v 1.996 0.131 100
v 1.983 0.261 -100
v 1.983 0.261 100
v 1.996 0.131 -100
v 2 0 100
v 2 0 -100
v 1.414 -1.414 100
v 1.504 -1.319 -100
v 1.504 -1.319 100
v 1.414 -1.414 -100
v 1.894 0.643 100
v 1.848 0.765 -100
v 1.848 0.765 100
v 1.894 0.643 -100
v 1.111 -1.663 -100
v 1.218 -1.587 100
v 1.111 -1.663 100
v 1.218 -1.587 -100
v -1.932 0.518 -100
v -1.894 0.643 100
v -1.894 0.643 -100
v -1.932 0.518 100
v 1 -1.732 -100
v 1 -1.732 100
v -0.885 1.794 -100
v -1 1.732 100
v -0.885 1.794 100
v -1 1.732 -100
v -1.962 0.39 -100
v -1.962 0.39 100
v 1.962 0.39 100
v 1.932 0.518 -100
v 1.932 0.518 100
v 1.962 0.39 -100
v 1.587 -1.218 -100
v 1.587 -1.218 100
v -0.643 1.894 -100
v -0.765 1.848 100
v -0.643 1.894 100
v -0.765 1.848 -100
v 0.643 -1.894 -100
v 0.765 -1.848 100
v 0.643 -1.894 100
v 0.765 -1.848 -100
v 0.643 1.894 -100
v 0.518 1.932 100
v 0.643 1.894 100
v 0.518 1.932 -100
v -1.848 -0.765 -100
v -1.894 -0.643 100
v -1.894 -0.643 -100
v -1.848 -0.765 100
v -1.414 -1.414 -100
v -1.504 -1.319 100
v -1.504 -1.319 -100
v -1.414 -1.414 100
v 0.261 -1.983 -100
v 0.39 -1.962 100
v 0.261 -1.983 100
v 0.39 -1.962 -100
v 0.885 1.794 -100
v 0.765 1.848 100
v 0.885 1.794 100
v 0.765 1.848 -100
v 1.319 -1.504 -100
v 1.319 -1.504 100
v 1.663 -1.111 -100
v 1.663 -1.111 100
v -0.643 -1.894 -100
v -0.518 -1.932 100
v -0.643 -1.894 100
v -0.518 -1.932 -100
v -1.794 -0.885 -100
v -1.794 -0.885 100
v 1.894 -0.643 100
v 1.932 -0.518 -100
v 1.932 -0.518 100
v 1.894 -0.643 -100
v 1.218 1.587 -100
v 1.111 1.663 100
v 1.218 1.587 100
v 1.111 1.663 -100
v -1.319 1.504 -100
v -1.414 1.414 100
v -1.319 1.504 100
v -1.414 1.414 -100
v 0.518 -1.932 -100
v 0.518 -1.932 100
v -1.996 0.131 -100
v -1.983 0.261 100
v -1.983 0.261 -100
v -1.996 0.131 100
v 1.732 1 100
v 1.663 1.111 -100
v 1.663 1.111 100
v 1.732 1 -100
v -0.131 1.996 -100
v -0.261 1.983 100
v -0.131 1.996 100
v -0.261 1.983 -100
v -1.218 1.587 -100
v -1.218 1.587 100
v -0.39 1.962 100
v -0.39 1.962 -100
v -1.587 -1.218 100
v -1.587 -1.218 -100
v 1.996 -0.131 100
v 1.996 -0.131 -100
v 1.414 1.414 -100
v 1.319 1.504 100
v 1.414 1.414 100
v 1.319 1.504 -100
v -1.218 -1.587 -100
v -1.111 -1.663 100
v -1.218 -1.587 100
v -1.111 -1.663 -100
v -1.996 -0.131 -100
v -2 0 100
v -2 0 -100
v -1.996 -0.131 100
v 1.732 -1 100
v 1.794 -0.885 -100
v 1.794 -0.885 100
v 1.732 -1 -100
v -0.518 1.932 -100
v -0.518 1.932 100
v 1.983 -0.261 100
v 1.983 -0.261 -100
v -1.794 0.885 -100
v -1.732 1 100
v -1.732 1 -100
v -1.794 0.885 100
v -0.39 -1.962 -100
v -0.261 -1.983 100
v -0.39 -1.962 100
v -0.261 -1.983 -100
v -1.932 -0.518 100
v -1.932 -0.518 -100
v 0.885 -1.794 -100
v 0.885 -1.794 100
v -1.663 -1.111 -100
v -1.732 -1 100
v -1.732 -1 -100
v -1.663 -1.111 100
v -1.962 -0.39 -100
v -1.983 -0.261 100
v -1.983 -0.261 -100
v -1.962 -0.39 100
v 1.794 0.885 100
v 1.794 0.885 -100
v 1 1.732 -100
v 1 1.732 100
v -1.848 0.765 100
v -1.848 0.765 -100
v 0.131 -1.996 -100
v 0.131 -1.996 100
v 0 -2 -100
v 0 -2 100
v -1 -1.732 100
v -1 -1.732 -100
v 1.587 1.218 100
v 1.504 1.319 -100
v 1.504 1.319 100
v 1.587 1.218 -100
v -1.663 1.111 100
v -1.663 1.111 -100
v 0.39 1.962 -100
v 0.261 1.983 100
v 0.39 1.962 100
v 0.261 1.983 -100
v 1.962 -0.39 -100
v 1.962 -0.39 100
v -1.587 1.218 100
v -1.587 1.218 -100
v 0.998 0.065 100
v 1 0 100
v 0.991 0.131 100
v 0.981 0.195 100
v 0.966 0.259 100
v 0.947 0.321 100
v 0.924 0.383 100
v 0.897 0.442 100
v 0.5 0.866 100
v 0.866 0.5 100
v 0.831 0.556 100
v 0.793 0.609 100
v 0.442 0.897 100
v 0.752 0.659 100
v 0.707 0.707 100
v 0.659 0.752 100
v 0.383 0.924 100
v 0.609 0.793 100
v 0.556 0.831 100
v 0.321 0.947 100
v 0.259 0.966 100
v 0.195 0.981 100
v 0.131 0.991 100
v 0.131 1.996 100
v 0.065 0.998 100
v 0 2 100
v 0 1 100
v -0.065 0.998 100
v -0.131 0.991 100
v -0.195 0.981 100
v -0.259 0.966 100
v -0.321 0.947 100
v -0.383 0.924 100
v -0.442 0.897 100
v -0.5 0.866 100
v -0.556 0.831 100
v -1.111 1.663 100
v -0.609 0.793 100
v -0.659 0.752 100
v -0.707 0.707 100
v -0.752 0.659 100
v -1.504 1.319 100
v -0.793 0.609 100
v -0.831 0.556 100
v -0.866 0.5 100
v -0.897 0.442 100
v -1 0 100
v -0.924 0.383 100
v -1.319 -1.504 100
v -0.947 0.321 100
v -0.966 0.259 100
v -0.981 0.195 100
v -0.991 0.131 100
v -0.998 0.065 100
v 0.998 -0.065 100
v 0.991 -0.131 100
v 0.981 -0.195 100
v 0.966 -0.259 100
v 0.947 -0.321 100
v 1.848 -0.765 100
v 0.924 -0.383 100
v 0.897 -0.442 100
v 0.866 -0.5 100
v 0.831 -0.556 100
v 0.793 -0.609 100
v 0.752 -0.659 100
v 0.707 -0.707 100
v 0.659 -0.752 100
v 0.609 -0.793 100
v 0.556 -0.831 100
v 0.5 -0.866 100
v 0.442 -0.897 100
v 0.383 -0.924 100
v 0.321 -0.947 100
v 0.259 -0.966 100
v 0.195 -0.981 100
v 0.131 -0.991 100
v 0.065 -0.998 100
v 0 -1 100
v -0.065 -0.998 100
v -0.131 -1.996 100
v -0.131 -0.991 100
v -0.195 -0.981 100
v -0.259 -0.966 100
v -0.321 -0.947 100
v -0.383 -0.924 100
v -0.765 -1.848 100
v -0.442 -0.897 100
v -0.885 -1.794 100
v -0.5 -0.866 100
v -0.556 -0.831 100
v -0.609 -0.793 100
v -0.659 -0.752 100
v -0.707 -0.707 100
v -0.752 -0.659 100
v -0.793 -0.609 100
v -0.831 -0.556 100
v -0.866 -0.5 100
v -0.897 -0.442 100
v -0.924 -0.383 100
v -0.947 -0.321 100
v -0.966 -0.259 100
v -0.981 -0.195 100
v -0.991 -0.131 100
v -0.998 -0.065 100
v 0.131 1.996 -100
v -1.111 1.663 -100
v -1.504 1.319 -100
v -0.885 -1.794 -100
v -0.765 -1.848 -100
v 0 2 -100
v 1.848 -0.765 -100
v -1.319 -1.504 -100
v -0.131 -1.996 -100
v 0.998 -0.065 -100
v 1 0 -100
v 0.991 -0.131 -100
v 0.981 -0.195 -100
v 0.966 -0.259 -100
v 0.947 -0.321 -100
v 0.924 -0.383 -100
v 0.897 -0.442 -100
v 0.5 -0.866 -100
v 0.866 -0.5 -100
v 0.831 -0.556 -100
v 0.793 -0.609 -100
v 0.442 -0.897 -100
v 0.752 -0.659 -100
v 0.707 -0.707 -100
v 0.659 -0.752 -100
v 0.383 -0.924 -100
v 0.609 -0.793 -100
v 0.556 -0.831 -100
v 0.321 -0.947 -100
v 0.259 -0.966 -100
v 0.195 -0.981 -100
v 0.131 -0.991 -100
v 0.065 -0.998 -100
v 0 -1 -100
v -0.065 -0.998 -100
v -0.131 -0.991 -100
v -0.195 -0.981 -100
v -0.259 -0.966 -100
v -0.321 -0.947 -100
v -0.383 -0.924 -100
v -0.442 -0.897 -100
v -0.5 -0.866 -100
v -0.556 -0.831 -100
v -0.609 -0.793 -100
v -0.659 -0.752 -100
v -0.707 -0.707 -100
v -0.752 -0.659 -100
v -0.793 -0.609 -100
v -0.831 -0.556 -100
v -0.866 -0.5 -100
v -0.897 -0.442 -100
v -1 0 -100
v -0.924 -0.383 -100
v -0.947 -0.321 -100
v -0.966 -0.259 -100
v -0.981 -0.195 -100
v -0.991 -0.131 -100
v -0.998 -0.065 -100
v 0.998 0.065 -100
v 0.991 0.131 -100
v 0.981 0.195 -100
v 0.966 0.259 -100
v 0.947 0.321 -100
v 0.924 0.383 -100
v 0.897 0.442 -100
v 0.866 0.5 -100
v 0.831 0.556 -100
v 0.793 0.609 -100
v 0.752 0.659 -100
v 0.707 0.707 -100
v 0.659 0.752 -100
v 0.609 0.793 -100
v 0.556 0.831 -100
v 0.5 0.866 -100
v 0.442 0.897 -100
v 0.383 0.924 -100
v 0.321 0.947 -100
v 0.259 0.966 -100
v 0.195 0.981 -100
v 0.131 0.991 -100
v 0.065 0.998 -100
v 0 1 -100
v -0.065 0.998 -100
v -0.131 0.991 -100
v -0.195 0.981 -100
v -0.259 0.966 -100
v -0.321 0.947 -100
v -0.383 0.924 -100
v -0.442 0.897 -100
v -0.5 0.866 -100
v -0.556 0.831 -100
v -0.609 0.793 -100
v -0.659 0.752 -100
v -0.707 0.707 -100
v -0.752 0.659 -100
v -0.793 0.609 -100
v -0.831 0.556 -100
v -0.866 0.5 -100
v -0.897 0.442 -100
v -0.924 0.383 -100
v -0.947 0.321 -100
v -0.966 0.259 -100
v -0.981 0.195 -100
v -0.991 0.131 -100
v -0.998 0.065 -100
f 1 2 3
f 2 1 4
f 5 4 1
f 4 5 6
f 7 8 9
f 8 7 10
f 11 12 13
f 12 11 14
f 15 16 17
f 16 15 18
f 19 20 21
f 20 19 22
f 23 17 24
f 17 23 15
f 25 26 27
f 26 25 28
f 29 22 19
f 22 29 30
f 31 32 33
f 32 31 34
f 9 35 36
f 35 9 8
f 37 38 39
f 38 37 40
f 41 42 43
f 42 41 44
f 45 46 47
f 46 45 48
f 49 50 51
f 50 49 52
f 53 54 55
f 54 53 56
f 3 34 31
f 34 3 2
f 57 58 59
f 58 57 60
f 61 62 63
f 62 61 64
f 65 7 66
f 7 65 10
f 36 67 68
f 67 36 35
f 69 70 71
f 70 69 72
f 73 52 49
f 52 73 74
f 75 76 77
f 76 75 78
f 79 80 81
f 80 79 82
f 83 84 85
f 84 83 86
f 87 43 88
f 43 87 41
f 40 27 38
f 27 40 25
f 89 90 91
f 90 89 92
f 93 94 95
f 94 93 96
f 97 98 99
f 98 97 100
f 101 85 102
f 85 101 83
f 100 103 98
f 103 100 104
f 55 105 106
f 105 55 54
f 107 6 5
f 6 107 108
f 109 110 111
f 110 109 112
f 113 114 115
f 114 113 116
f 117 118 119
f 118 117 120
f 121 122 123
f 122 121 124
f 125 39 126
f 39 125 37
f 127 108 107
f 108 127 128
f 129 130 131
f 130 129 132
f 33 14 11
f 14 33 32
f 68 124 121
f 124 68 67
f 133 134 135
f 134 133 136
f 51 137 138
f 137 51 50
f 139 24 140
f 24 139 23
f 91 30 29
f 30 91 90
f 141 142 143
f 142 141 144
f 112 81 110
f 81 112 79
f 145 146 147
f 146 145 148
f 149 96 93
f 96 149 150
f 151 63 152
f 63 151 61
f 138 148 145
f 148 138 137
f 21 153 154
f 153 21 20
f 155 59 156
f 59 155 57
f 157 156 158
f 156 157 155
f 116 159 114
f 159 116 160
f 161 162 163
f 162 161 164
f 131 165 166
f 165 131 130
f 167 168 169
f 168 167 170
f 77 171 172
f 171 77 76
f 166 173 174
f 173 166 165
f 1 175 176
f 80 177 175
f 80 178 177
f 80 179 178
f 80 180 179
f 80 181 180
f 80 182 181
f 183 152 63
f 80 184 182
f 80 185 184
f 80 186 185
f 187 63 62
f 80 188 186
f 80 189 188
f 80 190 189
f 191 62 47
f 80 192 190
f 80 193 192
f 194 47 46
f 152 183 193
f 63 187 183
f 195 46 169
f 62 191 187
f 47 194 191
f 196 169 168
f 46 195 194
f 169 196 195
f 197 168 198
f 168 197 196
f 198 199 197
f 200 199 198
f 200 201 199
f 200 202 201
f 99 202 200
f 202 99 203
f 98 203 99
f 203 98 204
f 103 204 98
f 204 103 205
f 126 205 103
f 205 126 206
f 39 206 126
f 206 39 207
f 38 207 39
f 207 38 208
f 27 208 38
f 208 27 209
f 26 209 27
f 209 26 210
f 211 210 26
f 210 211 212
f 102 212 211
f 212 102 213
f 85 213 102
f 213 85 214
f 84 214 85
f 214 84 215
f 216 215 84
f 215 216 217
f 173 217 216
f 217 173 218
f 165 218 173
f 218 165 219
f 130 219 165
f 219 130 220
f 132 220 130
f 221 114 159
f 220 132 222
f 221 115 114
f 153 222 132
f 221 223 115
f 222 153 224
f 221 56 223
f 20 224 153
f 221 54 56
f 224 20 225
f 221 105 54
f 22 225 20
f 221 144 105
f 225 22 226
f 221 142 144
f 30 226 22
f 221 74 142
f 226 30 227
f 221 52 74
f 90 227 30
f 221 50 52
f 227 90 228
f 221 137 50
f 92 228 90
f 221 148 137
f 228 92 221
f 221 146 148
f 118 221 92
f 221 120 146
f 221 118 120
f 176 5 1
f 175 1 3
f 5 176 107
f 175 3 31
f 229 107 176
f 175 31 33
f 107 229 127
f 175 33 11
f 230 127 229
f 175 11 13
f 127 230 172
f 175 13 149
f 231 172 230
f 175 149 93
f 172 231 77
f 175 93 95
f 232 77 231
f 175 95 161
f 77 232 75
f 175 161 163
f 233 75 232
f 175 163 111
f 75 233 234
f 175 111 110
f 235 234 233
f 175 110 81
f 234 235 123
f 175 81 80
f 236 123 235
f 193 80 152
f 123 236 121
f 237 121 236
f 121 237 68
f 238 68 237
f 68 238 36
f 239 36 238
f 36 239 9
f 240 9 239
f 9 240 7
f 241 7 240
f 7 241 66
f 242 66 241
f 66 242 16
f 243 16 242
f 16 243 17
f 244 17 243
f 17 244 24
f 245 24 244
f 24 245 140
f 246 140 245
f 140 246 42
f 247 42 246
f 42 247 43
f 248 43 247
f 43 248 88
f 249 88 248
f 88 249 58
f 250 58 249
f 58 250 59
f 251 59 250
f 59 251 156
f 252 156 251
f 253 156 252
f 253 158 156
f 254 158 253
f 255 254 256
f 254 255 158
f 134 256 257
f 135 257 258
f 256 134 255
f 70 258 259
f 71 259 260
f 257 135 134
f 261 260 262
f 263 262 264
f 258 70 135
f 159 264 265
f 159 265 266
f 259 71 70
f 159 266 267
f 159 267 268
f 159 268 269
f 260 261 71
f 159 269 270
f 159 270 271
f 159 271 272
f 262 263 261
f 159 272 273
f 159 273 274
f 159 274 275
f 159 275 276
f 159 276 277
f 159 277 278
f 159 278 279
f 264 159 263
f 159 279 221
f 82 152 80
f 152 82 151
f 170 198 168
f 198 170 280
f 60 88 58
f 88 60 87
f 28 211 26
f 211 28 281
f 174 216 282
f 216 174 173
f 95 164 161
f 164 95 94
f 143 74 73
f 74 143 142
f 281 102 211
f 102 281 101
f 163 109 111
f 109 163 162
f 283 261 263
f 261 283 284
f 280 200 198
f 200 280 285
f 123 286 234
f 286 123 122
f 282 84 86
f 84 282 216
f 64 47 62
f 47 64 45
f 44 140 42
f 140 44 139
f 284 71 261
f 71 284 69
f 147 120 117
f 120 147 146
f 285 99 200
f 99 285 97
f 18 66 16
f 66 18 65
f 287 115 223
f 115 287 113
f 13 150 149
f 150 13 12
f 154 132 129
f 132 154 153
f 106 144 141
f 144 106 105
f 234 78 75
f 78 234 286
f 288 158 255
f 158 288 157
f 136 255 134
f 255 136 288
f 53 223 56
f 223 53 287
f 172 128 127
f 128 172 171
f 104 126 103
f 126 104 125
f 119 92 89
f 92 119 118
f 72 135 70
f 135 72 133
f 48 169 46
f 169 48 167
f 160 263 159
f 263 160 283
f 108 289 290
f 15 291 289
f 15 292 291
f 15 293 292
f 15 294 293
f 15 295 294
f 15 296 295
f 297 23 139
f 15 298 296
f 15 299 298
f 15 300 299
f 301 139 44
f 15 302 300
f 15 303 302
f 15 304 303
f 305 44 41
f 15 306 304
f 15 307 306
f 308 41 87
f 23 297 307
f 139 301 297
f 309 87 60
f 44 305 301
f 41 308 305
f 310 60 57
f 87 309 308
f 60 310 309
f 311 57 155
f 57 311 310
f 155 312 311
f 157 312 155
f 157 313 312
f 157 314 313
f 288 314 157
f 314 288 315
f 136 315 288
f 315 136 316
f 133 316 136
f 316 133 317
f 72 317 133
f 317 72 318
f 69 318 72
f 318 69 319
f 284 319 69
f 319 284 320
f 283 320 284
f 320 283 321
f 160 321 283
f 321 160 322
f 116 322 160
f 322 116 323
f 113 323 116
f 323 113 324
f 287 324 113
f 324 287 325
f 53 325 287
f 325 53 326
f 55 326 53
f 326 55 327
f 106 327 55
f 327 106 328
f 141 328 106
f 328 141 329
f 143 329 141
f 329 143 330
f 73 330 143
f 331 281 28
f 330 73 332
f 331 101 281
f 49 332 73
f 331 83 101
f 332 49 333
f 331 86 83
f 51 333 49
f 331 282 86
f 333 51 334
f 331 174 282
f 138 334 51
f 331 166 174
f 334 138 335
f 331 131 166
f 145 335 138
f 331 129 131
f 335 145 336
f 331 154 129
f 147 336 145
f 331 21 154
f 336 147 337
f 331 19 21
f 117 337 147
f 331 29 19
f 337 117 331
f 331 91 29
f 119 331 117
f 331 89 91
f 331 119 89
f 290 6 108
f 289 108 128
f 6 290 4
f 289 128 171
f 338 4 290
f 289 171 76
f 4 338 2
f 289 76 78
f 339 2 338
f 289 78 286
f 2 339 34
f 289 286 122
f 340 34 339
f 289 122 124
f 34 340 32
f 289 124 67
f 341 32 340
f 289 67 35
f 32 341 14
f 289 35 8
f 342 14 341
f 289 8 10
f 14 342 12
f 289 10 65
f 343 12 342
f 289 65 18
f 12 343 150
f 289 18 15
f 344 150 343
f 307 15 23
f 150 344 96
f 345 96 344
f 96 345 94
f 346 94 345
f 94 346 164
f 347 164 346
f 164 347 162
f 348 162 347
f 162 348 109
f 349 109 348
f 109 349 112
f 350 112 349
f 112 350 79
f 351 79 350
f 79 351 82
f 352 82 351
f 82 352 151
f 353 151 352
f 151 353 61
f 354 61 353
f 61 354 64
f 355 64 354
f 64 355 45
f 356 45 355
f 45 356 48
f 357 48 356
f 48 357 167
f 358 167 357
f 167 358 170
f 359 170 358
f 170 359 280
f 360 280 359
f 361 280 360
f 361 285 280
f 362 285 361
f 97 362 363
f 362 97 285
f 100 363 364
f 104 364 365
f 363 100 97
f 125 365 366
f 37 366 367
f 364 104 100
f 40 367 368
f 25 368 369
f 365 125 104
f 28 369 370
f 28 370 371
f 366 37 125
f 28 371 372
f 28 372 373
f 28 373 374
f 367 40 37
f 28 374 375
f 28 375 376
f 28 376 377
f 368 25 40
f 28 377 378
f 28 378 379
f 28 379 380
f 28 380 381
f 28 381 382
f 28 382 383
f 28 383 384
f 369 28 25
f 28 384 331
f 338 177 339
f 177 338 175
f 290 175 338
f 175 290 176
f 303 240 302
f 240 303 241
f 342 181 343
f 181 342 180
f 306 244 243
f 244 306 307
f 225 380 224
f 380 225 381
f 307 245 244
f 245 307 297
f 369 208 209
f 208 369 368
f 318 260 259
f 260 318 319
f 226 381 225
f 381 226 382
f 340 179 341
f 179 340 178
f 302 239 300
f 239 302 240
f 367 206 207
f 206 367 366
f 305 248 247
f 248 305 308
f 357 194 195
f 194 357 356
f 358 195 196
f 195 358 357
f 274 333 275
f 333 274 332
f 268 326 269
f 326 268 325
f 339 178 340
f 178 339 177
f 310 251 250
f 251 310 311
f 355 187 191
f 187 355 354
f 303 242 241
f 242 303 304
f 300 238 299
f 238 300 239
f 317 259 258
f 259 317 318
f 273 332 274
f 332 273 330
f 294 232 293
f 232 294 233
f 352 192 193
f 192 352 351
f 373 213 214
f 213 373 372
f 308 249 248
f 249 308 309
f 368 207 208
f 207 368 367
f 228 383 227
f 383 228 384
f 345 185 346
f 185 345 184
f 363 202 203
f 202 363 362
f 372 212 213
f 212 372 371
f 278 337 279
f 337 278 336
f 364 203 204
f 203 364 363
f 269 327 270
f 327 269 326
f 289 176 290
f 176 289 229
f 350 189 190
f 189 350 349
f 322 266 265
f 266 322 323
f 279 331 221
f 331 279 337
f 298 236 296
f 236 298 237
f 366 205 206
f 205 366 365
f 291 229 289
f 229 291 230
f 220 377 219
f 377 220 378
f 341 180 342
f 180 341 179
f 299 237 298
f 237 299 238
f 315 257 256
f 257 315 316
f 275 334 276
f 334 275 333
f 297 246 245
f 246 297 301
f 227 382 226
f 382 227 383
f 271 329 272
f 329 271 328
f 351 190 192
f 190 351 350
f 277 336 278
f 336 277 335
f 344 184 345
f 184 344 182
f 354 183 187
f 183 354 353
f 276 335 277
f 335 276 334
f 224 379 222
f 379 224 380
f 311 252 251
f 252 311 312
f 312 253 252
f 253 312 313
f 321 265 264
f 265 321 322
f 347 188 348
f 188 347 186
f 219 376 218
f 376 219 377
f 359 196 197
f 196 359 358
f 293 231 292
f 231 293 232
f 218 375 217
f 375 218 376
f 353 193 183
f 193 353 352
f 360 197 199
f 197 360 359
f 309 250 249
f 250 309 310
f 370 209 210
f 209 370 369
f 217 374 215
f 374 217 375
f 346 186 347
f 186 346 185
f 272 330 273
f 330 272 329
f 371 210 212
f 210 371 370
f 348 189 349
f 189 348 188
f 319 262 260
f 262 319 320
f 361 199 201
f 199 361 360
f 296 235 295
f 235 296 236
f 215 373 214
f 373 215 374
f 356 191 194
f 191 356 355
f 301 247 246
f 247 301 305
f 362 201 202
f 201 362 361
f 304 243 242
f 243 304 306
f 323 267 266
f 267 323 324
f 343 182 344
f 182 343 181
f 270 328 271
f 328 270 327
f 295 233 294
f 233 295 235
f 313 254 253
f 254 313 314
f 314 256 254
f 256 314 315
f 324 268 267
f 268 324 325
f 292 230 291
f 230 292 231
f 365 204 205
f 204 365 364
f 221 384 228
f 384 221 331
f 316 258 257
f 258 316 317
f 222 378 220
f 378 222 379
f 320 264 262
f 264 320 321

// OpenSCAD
$fn=96;

module ptfe_tube(length=100, od=4, id=2) {
    difference() {
        cylinder(h=length, d=od, center=true);
        cylinder(h=length+0.2, d=id, center=true);
    }
}

ptfe_tube(length=200, od=4, id=2);
